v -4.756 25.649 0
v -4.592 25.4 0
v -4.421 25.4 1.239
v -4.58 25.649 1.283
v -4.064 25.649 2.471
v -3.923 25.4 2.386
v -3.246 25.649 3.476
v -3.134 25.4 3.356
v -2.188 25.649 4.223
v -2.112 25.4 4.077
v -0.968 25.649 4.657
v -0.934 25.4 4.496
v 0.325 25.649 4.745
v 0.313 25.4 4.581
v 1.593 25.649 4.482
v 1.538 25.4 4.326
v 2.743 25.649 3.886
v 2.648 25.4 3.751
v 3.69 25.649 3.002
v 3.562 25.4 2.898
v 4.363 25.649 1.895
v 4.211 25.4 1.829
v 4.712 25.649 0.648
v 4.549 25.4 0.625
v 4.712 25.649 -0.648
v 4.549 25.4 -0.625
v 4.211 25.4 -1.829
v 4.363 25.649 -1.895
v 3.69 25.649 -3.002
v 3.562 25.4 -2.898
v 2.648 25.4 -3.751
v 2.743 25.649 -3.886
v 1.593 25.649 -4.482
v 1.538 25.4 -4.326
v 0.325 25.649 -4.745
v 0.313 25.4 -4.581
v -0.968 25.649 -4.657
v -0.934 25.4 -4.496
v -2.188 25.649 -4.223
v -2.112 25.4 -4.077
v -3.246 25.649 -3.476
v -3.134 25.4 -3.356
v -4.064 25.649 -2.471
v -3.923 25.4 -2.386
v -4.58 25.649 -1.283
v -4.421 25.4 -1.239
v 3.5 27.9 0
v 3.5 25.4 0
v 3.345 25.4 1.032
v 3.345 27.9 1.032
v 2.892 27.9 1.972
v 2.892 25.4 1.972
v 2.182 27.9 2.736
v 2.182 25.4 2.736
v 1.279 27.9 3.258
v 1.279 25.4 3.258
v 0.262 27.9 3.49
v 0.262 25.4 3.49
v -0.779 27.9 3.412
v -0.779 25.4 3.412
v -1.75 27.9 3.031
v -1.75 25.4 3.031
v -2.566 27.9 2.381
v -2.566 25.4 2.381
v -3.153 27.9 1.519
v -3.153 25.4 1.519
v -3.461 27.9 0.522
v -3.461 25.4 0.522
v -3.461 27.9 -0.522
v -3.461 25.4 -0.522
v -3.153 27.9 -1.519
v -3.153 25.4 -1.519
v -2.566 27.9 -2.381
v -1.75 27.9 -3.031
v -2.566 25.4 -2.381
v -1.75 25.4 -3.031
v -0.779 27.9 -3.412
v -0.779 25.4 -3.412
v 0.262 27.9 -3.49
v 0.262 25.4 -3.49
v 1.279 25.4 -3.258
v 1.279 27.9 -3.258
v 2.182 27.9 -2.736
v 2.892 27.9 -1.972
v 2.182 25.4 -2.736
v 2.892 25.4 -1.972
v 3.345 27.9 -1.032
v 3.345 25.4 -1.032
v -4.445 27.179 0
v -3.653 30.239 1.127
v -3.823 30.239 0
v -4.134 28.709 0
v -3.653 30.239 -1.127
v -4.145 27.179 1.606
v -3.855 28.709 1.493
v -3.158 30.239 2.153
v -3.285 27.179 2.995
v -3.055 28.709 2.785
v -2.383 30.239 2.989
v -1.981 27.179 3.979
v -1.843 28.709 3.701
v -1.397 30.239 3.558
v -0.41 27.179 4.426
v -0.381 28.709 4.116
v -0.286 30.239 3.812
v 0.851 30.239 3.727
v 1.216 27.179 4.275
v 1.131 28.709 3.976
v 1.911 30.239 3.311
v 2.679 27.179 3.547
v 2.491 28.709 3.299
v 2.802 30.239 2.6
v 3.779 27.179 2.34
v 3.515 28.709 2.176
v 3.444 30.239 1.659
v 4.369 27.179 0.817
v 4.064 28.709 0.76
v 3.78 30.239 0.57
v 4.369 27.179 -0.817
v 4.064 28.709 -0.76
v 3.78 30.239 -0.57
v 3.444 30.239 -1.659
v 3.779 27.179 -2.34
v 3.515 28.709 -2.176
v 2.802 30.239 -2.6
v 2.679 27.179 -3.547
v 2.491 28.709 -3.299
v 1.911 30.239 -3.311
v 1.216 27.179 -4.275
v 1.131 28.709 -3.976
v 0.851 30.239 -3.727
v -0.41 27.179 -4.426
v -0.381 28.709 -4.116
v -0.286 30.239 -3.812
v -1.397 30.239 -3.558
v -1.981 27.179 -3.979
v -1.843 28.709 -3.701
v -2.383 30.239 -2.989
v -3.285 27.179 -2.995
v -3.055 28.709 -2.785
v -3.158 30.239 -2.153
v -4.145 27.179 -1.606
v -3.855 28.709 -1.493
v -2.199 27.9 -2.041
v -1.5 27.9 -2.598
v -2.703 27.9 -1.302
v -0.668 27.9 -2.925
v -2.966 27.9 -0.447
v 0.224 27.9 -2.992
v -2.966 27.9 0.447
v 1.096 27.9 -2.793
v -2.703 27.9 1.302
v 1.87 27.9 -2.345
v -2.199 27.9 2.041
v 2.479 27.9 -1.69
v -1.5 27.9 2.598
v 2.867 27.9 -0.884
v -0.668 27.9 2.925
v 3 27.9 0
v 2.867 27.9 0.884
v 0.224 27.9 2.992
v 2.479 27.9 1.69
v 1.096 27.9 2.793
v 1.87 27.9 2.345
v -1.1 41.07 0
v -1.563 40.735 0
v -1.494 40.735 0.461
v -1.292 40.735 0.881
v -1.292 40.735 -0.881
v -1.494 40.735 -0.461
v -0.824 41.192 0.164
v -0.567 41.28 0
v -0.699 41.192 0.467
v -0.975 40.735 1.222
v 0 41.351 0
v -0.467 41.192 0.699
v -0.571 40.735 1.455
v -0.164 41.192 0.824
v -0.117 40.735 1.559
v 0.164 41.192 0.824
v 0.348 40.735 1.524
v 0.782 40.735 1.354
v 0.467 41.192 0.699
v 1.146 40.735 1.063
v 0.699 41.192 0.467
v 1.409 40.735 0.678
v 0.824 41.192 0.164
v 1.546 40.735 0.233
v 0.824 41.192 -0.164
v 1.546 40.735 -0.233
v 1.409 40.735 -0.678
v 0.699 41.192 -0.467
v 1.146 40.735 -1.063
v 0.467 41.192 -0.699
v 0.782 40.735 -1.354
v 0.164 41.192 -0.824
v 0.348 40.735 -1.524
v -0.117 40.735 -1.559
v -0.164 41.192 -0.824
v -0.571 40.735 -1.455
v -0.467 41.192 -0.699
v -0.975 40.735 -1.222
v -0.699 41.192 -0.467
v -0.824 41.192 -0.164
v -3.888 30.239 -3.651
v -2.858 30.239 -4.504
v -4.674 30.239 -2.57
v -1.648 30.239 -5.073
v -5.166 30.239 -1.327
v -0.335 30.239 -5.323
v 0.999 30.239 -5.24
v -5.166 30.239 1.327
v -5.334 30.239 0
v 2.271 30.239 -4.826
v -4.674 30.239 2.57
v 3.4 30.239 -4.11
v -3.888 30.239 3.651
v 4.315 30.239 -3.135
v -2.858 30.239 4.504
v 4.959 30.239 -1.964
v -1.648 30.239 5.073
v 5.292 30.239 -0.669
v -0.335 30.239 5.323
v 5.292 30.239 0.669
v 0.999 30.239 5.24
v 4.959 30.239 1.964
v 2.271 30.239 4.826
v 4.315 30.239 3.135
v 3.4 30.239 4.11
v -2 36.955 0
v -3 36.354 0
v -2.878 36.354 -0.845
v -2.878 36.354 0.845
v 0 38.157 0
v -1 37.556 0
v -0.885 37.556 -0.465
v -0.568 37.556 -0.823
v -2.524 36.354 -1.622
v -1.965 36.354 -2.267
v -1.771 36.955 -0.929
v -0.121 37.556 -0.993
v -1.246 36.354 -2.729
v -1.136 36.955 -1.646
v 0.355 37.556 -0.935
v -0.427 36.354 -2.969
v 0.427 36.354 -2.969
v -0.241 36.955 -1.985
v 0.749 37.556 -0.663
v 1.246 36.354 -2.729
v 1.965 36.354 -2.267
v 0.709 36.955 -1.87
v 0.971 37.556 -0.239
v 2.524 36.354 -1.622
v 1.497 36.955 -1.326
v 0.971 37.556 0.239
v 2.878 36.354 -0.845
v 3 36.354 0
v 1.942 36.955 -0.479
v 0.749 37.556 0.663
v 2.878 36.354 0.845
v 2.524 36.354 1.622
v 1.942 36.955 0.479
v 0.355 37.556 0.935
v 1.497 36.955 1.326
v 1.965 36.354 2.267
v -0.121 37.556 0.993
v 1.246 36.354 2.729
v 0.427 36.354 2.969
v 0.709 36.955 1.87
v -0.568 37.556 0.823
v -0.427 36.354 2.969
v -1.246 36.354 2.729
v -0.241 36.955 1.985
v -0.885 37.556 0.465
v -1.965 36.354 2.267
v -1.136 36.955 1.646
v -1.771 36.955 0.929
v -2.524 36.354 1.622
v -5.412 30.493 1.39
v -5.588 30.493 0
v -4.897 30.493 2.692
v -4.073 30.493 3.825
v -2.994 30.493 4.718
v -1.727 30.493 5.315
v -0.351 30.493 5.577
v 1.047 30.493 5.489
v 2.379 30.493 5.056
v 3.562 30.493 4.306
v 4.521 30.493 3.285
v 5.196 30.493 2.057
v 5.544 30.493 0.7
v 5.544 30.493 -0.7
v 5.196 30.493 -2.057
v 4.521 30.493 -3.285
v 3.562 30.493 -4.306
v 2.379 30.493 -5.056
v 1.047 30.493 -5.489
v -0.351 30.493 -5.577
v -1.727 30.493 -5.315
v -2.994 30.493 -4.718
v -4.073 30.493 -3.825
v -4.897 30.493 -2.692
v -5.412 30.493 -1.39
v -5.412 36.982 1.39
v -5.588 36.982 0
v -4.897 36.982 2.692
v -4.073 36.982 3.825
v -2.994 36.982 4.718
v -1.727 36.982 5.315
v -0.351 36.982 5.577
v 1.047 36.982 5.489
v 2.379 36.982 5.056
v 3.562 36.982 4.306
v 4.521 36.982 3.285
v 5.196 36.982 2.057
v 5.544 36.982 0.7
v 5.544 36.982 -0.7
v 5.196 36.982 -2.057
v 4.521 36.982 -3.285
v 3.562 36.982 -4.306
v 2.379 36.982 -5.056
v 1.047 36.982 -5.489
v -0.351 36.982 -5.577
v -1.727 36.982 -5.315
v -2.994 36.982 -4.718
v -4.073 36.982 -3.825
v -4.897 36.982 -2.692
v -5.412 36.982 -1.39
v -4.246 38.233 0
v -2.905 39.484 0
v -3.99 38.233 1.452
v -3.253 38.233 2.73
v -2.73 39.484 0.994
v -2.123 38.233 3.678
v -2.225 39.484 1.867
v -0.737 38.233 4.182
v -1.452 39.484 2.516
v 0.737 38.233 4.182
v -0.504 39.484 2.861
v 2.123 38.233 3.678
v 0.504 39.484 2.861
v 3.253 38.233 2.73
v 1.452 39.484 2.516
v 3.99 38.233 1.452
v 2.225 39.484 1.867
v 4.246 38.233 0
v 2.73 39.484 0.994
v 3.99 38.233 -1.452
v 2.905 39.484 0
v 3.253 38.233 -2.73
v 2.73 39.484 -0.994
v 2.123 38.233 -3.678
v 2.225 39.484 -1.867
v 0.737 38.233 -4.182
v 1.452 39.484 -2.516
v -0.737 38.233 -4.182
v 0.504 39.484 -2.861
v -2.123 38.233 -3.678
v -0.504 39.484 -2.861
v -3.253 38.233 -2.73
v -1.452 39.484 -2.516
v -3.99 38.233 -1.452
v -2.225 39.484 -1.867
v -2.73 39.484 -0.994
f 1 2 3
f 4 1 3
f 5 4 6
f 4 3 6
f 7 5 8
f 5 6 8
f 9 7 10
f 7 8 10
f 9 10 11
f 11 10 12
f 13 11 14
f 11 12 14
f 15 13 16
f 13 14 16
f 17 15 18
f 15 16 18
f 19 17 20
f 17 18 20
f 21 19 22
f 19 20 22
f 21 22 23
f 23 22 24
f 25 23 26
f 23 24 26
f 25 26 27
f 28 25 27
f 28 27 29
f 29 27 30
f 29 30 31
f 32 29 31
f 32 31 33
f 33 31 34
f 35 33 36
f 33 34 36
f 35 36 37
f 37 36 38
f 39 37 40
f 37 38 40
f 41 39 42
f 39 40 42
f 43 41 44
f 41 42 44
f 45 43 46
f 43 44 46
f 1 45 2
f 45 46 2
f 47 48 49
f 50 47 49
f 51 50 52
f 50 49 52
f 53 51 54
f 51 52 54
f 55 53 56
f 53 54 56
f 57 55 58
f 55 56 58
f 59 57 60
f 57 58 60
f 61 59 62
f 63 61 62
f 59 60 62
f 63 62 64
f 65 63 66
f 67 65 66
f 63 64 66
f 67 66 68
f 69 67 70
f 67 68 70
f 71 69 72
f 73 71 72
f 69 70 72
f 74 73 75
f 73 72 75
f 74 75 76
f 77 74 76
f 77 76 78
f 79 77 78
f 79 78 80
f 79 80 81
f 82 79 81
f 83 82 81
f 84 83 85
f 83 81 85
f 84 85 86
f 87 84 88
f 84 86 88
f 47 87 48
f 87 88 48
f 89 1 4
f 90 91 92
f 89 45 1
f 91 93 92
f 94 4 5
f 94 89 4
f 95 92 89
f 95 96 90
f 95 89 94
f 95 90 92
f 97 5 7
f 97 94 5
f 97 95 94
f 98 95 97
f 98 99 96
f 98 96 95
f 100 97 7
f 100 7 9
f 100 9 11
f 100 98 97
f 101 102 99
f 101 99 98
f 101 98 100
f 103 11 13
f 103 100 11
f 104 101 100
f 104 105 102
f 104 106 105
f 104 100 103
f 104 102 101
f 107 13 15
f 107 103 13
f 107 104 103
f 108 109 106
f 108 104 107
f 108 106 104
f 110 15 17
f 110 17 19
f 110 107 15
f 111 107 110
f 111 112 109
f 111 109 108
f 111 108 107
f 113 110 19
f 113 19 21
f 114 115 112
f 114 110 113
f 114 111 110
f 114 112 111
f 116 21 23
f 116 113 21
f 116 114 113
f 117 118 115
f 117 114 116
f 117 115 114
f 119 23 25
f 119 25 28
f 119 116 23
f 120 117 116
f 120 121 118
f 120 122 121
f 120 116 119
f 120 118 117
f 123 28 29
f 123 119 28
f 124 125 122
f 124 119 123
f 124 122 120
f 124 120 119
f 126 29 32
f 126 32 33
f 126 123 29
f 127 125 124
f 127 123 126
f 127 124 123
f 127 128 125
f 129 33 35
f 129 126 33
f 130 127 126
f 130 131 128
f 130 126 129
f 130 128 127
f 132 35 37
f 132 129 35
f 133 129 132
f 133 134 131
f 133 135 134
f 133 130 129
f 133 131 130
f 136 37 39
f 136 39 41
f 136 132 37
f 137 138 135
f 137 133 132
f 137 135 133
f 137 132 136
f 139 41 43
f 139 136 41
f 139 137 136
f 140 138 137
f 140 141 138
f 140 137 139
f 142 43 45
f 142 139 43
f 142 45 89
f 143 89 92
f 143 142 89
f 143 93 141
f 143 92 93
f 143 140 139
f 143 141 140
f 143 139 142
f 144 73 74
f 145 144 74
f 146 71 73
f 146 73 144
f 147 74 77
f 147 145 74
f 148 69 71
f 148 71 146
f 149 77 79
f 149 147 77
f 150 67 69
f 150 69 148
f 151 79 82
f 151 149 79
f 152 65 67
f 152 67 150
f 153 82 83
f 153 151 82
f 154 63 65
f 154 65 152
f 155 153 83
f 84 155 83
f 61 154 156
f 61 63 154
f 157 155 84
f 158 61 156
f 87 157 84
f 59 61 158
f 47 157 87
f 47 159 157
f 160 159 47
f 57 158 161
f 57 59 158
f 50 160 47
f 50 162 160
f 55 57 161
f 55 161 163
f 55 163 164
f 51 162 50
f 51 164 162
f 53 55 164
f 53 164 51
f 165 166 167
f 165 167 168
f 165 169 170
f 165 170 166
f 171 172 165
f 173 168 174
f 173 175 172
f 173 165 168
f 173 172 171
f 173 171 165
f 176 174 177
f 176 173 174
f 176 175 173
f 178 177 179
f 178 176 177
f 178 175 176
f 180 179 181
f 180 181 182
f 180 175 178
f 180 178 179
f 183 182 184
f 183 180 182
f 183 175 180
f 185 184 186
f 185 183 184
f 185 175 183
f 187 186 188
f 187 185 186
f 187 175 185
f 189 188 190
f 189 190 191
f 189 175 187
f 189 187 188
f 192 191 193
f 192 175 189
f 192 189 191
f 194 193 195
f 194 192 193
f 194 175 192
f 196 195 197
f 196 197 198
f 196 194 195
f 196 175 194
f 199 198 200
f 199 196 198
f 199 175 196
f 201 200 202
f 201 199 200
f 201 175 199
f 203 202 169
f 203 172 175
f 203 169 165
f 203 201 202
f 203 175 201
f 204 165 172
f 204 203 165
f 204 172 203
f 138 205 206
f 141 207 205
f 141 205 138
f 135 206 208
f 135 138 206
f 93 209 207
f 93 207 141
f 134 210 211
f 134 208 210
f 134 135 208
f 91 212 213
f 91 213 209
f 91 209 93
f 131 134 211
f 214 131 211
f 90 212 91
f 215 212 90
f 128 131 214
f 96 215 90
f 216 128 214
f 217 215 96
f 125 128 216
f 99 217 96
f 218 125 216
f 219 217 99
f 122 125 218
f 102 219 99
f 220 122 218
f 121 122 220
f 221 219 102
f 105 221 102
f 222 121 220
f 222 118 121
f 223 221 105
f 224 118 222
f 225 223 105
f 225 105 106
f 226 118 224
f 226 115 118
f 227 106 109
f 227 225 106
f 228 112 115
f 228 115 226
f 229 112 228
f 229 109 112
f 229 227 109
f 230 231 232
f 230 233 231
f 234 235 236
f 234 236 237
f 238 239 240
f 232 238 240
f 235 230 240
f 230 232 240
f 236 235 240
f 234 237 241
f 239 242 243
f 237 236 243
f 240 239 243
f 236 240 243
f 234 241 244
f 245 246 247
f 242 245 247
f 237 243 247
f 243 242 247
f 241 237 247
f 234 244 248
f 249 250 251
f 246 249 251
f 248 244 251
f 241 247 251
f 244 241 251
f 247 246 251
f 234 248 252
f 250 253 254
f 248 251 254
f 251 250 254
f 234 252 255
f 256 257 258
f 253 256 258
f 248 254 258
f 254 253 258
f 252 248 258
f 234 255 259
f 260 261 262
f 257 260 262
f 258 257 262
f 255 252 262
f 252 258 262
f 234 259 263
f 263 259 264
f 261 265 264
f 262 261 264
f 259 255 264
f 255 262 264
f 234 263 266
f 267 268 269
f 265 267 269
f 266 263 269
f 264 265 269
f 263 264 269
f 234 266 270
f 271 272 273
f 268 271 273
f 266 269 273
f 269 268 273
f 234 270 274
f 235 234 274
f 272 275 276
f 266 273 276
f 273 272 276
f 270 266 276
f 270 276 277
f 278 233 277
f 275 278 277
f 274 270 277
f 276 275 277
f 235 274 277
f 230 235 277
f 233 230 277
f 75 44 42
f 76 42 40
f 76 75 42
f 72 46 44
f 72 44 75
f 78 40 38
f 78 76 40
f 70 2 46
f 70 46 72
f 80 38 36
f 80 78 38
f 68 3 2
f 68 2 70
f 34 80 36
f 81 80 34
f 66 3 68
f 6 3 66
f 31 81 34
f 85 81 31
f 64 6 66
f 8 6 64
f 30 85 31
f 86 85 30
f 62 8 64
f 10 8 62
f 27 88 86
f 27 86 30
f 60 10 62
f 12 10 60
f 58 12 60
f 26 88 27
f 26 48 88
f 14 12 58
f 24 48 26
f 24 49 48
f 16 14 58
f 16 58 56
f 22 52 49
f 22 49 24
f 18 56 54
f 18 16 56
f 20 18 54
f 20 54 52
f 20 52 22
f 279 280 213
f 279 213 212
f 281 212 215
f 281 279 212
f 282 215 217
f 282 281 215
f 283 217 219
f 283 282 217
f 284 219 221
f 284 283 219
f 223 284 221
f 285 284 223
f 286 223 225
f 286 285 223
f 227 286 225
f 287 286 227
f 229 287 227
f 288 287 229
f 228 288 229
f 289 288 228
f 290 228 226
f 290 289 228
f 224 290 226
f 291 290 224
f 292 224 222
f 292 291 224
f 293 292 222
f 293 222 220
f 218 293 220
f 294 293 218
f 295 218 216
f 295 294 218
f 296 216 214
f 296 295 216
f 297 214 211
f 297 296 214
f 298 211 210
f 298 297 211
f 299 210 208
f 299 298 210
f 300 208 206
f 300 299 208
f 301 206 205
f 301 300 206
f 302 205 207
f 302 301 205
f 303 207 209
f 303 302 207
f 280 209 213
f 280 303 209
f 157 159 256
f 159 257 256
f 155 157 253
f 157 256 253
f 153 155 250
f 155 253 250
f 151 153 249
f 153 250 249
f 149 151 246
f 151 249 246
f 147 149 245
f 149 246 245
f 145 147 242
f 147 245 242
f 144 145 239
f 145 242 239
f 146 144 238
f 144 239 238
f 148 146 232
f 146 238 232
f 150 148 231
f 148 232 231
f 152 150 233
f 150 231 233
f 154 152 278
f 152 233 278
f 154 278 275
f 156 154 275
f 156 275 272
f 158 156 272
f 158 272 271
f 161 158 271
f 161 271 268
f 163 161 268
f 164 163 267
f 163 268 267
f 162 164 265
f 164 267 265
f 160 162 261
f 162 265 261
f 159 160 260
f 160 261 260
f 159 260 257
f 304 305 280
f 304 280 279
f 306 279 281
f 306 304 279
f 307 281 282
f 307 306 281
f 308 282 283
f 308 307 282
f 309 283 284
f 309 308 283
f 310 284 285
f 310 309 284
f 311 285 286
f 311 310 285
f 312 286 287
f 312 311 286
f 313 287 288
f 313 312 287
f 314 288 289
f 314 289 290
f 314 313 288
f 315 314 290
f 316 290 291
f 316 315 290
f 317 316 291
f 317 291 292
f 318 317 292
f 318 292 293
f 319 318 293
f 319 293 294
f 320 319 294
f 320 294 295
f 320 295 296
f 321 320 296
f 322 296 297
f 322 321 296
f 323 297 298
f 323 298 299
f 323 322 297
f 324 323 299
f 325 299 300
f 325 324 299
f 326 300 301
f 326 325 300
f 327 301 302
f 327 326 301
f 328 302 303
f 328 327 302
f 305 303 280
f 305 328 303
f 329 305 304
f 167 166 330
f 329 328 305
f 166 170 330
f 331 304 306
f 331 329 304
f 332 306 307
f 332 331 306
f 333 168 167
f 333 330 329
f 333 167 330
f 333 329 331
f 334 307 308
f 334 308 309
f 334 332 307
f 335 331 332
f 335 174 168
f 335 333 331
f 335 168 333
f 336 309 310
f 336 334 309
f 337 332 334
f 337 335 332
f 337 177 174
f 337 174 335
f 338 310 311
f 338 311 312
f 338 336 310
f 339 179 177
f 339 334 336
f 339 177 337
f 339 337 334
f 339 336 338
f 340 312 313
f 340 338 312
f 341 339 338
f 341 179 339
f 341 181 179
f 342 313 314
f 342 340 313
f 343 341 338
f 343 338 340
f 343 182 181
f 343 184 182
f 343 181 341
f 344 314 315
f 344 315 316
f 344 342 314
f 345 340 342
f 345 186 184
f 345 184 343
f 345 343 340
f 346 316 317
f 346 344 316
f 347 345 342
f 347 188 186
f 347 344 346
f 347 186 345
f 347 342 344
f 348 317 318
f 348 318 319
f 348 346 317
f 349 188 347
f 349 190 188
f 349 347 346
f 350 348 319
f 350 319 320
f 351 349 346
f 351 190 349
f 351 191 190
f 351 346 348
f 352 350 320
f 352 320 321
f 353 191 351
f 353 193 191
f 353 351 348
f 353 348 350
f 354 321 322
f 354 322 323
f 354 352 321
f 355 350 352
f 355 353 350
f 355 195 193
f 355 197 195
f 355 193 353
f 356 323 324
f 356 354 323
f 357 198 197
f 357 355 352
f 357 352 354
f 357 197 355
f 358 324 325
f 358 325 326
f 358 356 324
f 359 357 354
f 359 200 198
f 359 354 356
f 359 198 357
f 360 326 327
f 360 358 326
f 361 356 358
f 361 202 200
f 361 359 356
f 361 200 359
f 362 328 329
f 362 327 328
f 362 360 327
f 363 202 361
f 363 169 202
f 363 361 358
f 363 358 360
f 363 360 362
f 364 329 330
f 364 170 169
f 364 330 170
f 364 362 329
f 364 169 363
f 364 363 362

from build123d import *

# Parameters (mm, degrees)
CHAMFER1_SIZE              = 0.254
CHAMFER1_EDGE_2_SIZE2      = 0.215388858
CHAMFER1_EDGE_2_SIZE       = 0.254
SKETCH4_R                  = 3.5
CUT_EXTRUDE1_DEPTH         = 2.5
M7X0_75_TAPPED_HOLE1_D     = 6
M7X0_75_TAPPED_HOLE1_DEPTH = 10.954004
M7X0_75_TAPPED_HOLE1_TIP   = 1.802581857


with BuildPart() as part:
    # Sketch1 → Revolve1 (revolve)
    with BuildSketch(Plane.XY):
        with BuildLine():
            Line((0, 25.4), (-4.80695, 25.4))
            Line((-4.80695, 25.4), (-3.8227, 30.2387))
            Line((-3.8227, 30.2387), (-5.588, 30.2387))
            Line((-5.588, 30.2387), (-5.588, 36.9824))
            Line((-5.588, 36.9824), (-1.563367534, 40.735379295))
            ThreePointArc((-1.563367534, 40.735379295), (-0.840141831, 41.19169557), (0, 41.3512))
            Line((0, 41.3512), (0, 25.4))
        make_face()
    revolve(axis=Axis((0, 25.4, 0), (0, 1, 0)))

    # Chamfer1
    chamfer1_edges = [part.edges().sort_by_distance(p)[0] for p in [
        (5.588, 30.2387, 0),
    ]]
    chamfer(chamfer1_edges, length=CHAMFER1_SIZE)

    # Chamfer1 edge 2
    chamfer1_edge_2_edges = [part.edges().sort_by_distance(p)[0] for p in [
        (4.80695, 25.4, 0),
    ]]
    chamfer(chamfer1_edge_2_edges, length=CHAMFER1_EDGE_2_SIZE, length2=CHAMFER1_EDGE_2_SIZE2)

    # Sketch4 → Cut-Extrude1 (cut)
    with BuildSketch(Plane.XZ.offset(-25.4)):
        Circle(SKETCH4_R)
    extrude(amount=-CUT_EXTRUDE1_DEPTH, mode=Mode.SUBTRACT)

    # M7x0.75 Tapped Hole1
    with Locations(Plane(origin=(0, 25.4, 0), x_dir=(-1, 0, 0), z_dir=(0, -1, 0))):
        with Locations((0, 0), (96.139395676, -180.684699687)):
            Hole(M7X0_75_TAPPED_HOLE1_D / 2, depth=M7X0_75_TAPPED_HOLE1_DEPTH)
            with Locations((0, 0, -(M7X0_75_TAPPED_HOLE1_DEPTH + M7X0_75_TAPPED_HOLE1_TIP / 2))):  # 118° drill point
                Cone(0, M7X0_75_TAPPED_HOLE1_D / 2, M7X0_75_TAPPED_HOLE1_TIP, mode=Mode.SUBTRACT)


solid = part.part
